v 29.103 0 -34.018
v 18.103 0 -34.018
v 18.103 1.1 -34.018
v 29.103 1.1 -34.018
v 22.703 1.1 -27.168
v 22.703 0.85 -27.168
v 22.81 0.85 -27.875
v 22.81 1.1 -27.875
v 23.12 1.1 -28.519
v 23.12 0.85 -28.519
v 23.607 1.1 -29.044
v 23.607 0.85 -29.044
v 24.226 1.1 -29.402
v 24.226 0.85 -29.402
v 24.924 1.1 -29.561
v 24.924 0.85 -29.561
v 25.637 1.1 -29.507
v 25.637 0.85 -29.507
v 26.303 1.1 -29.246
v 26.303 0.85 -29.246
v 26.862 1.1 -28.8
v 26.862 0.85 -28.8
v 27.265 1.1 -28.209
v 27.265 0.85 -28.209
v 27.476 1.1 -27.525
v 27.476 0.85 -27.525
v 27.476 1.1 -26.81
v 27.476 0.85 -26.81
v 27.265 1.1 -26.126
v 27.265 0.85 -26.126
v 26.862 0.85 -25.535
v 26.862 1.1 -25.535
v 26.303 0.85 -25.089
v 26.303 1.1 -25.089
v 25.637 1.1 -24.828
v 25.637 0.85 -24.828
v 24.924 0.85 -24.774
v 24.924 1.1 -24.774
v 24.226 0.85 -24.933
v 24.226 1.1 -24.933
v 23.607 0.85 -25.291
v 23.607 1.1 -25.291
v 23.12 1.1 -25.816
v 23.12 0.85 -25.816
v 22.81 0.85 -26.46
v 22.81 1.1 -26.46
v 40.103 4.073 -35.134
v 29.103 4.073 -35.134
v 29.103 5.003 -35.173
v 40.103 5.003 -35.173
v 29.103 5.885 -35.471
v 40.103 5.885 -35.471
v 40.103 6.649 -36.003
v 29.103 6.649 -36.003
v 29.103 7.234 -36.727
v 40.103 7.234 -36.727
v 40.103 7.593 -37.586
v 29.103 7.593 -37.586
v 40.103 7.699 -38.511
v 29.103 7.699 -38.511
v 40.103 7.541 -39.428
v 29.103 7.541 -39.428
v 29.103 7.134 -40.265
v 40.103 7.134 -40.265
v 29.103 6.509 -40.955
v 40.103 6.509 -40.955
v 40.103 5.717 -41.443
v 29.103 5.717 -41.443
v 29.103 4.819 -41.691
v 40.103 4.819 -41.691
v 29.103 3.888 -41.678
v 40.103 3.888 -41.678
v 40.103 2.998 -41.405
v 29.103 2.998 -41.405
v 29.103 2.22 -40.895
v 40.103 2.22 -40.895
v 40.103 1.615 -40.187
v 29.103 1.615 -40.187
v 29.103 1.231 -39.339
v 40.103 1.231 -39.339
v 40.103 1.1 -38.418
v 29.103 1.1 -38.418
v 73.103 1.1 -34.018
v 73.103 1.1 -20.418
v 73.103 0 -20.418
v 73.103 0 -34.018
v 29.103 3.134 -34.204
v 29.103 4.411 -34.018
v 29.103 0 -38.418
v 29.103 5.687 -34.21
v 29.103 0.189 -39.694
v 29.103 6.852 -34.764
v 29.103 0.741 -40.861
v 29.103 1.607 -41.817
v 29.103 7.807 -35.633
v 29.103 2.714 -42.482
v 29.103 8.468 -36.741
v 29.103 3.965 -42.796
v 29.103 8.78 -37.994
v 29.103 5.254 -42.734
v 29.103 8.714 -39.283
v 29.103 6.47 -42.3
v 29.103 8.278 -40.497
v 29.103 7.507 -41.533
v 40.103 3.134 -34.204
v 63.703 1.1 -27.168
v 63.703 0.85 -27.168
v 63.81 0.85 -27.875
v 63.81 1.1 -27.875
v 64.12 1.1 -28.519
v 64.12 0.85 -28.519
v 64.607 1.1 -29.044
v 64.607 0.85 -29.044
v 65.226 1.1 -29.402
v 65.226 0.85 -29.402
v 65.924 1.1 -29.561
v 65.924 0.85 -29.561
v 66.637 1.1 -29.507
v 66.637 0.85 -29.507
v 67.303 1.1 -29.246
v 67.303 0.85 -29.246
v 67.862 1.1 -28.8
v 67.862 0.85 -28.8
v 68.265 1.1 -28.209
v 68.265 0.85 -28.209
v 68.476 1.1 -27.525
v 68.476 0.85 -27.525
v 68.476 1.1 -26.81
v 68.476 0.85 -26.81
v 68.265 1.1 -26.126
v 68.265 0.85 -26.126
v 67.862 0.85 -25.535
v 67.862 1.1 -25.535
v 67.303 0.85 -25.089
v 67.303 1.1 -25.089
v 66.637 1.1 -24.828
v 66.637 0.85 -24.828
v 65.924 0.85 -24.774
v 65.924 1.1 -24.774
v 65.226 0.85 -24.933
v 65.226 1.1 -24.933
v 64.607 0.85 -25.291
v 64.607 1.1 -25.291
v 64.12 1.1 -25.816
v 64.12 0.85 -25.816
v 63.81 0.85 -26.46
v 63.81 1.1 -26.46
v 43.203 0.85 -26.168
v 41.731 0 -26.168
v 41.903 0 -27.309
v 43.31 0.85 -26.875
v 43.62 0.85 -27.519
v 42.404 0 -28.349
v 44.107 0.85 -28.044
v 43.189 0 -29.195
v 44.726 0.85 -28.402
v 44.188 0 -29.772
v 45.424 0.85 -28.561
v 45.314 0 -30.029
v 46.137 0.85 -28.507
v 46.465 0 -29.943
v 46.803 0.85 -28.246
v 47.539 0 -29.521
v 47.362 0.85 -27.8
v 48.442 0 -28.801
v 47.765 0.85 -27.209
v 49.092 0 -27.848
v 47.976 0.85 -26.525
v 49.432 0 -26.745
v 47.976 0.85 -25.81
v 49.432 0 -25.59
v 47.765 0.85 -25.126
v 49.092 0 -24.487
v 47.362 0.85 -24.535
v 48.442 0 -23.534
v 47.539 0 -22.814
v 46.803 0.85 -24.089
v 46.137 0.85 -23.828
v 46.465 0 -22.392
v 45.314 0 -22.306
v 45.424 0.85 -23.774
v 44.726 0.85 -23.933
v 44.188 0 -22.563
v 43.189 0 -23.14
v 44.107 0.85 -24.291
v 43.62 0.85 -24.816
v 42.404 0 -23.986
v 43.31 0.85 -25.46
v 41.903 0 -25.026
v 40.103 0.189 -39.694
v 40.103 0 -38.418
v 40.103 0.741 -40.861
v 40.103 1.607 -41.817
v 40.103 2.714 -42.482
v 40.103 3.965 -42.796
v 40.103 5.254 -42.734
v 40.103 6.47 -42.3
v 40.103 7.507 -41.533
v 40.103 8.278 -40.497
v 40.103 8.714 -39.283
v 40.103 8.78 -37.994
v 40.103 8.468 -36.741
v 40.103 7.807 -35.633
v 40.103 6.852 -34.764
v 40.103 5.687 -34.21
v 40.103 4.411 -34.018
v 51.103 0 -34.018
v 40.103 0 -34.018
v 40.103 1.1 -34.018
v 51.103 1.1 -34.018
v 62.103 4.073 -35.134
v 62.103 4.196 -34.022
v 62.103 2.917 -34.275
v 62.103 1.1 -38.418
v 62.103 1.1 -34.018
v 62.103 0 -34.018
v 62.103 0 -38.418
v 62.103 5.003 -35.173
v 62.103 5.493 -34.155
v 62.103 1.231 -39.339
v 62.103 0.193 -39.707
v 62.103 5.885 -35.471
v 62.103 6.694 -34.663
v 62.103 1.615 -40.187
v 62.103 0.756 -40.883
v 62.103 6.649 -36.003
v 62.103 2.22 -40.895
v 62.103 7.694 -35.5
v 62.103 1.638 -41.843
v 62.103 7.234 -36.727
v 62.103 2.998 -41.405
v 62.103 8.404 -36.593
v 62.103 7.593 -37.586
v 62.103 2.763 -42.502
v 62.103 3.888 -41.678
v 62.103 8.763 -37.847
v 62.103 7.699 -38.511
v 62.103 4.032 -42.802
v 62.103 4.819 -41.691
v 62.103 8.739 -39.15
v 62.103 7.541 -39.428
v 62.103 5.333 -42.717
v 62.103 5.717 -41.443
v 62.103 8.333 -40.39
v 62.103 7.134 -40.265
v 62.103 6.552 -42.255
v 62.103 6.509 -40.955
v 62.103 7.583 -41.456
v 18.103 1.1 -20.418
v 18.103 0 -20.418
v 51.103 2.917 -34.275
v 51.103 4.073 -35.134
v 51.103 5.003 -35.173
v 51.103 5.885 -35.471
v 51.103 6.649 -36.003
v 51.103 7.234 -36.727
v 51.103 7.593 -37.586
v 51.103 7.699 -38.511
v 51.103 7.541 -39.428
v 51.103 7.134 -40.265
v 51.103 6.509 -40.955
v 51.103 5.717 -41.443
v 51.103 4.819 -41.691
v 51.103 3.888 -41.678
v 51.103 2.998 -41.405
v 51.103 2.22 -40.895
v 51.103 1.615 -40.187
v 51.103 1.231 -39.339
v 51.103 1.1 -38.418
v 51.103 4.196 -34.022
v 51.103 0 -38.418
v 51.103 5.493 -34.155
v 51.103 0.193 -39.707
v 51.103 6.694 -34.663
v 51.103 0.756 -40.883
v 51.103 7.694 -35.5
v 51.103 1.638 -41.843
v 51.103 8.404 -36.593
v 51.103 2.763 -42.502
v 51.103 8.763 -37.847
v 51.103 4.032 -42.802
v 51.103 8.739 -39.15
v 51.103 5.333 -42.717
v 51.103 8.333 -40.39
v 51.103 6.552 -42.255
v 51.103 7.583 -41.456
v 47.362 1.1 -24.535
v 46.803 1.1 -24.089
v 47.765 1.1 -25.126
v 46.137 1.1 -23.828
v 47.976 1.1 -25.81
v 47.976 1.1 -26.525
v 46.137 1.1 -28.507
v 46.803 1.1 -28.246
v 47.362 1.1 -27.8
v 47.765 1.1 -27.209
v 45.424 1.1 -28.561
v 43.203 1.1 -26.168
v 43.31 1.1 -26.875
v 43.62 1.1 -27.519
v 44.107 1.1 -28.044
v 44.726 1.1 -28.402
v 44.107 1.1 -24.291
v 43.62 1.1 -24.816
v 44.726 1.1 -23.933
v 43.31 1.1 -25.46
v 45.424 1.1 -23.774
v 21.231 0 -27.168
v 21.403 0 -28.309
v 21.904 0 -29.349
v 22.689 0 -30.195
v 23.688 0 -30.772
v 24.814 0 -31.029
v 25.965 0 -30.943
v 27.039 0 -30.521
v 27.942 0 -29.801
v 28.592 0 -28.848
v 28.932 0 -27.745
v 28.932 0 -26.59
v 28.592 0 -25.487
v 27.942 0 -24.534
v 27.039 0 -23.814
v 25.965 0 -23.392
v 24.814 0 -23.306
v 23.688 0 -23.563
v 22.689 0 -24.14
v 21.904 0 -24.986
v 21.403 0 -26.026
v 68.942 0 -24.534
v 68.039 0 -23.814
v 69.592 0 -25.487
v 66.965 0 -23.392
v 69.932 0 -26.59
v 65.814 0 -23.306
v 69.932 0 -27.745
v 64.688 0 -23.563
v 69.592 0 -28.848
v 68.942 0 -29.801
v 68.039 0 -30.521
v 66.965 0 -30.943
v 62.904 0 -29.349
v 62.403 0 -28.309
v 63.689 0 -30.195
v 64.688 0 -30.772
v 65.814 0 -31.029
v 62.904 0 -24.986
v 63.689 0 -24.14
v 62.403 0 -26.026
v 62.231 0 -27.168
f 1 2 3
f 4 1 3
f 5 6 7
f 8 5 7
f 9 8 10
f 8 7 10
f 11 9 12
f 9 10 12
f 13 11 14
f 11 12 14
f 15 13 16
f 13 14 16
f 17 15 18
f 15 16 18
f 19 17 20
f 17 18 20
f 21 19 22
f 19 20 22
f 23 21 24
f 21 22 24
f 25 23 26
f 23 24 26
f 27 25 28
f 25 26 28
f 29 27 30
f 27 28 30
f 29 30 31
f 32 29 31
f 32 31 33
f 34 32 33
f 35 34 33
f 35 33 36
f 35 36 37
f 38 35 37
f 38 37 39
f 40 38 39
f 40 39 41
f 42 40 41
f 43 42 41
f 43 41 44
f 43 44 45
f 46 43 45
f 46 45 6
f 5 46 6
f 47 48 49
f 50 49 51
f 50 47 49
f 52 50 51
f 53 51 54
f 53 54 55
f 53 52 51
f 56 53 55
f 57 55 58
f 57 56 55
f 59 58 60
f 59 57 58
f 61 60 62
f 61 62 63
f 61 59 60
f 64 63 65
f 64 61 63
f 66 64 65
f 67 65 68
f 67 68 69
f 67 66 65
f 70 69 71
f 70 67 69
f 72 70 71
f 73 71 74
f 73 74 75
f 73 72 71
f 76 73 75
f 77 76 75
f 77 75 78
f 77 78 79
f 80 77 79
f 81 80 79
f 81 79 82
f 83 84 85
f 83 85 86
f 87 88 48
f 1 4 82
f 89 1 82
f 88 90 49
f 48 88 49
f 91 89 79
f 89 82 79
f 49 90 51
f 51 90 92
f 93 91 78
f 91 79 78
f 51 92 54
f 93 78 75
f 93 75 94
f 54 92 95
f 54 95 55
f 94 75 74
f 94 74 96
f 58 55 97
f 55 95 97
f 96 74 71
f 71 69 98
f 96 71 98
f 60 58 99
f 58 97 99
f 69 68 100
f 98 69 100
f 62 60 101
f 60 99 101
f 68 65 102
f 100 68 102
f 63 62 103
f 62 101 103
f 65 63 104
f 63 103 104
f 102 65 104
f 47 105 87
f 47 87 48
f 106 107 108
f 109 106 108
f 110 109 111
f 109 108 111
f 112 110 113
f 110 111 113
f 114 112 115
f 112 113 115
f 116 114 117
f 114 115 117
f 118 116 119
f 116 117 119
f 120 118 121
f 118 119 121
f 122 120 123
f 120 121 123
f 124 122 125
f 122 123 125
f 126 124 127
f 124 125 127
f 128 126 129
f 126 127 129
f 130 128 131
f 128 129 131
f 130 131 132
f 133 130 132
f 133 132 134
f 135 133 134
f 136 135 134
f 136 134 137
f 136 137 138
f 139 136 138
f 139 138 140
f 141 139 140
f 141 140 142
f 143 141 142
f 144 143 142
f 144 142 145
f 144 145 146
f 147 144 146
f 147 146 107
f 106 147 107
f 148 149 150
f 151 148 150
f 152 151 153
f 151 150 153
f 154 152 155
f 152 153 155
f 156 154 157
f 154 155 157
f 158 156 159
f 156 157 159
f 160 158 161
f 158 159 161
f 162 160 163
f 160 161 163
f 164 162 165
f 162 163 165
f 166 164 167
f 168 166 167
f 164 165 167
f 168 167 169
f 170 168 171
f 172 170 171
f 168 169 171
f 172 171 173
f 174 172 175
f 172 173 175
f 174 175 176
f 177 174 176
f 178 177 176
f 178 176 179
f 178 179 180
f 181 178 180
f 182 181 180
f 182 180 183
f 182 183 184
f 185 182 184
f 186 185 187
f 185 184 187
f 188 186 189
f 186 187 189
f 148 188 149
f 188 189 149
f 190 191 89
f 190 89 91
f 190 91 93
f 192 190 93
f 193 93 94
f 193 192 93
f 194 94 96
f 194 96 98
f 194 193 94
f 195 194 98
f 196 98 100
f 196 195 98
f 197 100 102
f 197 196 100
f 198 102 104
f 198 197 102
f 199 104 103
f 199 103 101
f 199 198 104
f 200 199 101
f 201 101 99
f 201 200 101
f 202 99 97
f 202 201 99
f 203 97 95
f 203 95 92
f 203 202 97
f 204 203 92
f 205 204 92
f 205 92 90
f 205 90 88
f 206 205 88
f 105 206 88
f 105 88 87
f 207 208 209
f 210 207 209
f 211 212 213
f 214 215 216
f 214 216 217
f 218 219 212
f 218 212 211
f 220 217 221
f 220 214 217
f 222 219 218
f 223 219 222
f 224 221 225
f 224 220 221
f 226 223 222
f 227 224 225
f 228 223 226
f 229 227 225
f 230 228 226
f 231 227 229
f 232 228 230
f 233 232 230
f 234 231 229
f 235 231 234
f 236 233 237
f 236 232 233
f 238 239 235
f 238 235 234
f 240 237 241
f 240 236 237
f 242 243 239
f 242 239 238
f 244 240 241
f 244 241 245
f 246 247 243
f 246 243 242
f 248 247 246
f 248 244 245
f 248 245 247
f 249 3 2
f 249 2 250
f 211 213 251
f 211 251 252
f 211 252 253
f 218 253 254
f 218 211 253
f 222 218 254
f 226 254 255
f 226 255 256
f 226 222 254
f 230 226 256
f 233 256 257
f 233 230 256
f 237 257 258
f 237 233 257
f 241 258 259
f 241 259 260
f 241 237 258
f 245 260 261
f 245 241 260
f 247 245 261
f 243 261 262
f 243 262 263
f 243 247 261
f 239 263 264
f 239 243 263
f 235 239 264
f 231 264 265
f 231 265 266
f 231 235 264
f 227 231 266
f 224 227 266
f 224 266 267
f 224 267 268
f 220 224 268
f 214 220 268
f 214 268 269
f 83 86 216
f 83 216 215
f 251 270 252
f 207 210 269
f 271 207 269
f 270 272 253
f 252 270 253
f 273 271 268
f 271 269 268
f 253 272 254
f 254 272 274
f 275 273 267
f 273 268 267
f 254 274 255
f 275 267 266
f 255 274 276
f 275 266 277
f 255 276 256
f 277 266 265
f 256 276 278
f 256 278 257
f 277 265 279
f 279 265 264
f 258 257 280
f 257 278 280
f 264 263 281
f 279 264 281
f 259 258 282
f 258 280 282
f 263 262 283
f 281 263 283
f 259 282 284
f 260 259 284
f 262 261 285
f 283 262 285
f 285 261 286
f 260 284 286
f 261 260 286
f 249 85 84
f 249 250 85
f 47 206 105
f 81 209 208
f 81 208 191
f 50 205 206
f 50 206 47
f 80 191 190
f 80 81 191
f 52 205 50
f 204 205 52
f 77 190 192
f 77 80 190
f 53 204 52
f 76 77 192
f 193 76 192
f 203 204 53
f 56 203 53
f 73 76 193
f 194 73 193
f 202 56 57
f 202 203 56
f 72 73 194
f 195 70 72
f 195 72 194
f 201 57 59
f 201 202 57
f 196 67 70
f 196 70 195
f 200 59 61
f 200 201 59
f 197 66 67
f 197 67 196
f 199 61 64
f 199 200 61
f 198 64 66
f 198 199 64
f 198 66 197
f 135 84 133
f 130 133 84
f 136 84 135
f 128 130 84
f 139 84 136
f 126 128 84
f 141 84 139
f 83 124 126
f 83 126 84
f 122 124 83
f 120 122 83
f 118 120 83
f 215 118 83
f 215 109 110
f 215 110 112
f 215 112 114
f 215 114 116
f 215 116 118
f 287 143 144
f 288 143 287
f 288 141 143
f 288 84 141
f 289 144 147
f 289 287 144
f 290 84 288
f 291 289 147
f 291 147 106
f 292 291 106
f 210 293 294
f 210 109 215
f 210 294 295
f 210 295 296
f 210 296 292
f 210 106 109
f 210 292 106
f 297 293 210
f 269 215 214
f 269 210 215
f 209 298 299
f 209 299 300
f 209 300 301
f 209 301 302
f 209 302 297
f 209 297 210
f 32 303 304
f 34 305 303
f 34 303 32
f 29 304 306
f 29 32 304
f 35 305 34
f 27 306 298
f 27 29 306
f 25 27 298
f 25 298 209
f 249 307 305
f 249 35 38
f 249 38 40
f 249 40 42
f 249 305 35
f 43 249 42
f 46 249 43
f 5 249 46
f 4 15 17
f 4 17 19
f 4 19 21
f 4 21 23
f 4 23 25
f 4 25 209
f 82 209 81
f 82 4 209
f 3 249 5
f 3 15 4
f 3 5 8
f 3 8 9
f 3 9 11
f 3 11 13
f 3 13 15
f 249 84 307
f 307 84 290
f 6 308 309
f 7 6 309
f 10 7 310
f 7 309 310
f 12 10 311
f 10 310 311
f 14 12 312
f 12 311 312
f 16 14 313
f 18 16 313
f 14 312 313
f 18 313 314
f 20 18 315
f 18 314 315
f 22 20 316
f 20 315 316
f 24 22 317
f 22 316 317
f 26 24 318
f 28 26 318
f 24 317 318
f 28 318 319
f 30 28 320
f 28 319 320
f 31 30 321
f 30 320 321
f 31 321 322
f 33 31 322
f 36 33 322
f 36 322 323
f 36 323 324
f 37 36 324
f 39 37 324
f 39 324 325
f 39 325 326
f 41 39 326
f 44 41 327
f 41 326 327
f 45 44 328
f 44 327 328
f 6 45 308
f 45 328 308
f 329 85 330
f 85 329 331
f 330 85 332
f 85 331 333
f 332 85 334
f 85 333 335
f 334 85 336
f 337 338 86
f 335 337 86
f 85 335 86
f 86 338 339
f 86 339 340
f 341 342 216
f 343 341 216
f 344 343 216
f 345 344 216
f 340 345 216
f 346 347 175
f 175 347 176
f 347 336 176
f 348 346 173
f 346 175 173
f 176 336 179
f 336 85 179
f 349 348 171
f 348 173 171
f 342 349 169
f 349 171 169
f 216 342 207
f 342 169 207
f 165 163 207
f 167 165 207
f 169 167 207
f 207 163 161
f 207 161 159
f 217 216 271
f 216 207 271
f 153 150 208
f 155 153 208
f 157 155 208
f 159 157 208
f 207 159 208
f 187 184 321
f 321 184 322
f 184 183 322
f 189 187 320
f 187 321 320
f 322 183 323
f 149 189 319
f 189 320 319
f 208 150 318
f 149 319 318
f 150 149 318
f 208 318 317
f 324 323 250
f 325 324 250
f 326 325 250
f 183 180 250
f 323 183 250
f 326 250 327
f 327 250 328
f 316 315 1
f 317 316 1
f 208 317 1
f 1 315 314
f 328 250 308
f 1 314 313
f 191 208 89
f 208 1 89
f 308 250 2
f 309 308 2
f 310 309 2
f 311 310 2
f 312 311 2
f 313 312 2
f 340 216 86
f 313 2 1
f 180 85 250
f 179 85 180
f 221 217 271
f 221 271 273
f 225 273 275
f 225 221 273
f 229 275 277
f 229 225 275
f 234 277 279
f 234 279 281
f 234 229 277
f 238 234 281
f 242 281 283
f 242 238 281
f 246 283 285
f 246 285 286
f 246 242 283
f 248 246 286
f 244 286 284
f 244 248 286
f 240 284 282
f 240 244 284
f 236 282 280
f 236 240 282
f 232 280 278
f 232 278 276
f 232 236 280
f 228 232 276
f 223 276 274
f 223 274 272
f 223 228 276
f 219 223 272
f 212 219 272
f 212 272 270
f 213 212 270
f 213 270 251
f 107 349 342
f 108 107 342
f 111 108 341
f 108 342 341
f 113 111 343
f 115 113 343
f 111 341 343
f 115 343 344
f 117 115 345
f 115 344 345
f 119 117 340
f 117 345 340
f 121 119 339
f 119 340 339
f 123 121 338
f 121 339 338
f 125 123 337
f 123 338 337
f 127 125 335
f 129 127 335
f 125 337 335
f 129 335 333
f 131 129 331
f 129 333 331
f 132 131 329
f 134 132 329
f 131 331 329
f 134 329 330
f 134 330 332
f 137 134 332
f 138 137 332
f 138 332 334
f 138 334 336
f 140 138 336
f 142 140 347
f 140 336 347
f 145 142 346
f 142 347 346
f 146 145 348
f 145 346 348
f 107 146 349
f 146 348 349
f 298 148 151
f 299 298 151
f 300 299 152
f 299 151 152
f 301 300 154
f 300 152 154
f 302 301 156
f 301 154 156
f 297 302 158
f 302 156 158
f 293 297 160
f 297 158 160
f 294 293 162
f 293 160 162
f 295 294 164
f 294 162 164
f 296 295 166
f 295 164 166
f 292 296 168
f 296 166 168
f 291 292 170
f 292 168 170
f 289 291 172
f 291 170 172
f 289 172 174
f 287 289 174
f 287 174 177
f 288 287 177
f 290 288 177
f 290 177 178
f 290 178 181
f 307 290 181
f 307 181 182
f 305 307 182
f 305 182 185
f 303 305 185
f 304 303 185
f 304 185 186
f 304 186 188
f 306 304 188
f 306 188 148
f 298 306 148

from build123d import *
from OCP.BRepFilletAPI import BRepFilletAPI_MakeChamfer

# Parameters (mm, degrees)
BOSS_EXTRUDE1_DEPTH = 11
SKETCH2_W           = 13.6
SKETCH2_H           = 1.1
BOSS_EXTRUDE2_DEPTH = 11
BOSS_EXTRUDE3_DEPTH = 11
SKETCH4_W           = 13.6
SKETCH4_H           = 1.1
BOSS_EXTRUDE4_DEPTH = 11
SKETCH5_W           = 13.6
SKETCH5_H           = 1.1
BOSS_EXTRUDE5_DEPTH = 11
HOLE_WIZARD_M4_1_D  = 4.8
CHAMFER1_SIZE       = 0.85
CHAMFER1_SIZE2      = 1.472243186


with BuildPart() as part:
    # Sketch1 → Boss-Extrude1 (new body)
    with BuildSketch(Plane(origin=(62.103, 0, 0), x_dir=(0, 0, -1), z_dir=(1, 0, 0))):
        with BuildLine():
            Line((34.275005652, 2.916847756), (35.133702257, 4.073392616))
            ThreePointArc((35.133702257, 4.073392616), (40.63247129, 6.846201583), (38.4175, 1.1))
            Line((38.4175, 1.1), (20.4175, 1.1))
            Line((20.4175, 1.1), (20.4175, 0))
            Line((20.4175, 0), (38.4175, 0))
            ThreePointArc((38.4175, 0), (40.950692662, 7.997629072), (34.275005652, 2.916847756))
        make_face()
    extrude(amount=-BOSS_EXTRUDE1_DEPTH)

    # Sketch2 → Boss-Extrude2 (add)
    with BuildSketch(Plane.ZY.offset(-51.103)):
        with Locations((-27.2175, 0.55)):
            Rectangle(SKETCH2_W, SKETCH2_H)
    extrude(amount=BOSS_EXTRUDE2_DEPTH)

    # Sketch3 → Boss-Extrude3 (add)
    with BuildSketch(Plane.ZY.offset(-40.103)):
        with BuildLine():
            Line((-38.4175, 1.1), (-20.4175, 1.1))
            Line((-20.4175, 1.1), (-20.4175, 0))
            Line((-20.4175, 0), (-38.4175, 0))
            ThreePointArc((-38.4175, 0), (-41.043236571, 7.930652555), (-34.203607486, 3.133860244))
            Line((-34.203607486, 3.133860244), (-35.133702257, 4.073392616))
            ThreePointArc((-35.133702257, 4.073392616), (-40.63247129, 6.846201583), (-38.4175, 1.1))
        make_face()
    extrude(amount=BOSS_EXTRUDE3_DEPTH)

    # Sketch4 → Boss-Extrude4 (add)
    with BuildSketch(Plane.ZY.offset(-29.103)):
        with Locations((-27.2175, 0.55)):
            Rectangle(SKETCH4_W, SKETCH4_H)
    extrude(amount=BOSS_EXTRUDE4_DEPTH)

    # Sketch5 → Boss-Extrude5 (add)
    with BuildSketch(Plane(origin=(62.103, 0, 0), x_dir=(0, 0, -1), z_dir=(1, 0, 0))):
        with Locations((27.2175, 0.55)):
            Rectangle(SKETCH5_W, SKETCH5_H)
    extrude(amount=BOSS_EXTRUDE5_DEPTH)

    # M4 间隙孔1 (through all)
    with Locations(Plane(origin=(0, 1.1, 0), x_dir=(1, 0, 0), z_dir=(0, 1, 0))):
        with Locations((45.603, 26.1675), (25.103, 27.1675), (66.103, 27.1675)):
            Hole(HOLE_WIZARD_M4_1_D / 2)

    # Chamfer1: one chamfer whose edges measure the first distance from different faces: ONE call of the kernel's chamfer builder (chamfer() names one face for all edges)
    chamfer1_edges_1 = [part.edges().sort_by_distance(p)[0] for p in [
        (68.503, 0, -27.1675),
    ]]
    chamfer1_side_1 = [part.faces().sort_by_distance(p)[0] for p in [
        (68.503, 0.55, -27.1675),
    ]]
    chamfer1_edges_2 = [part.edges().sort_by_distance(p)[0] for p in [
        (27.503, 0, -27.1675),
    ]]
    chamfer1_side_2 = [part.faces().sort_by_distance(p)[0] for p in [
        (27.503, 0.55, -27.1675),
    ]]
    chamfer1_edges_3 = [part.edges().sort_by_distance(p)[0] for p in [
        (48.003, 0, -26.1675),
    ]]
    chamfer1_side_3 = [part.faces().sort_by_distance(p)[0] for p in [
        (48.003, 0.55, -26.1675),
    ]]
    chamfer1 = BRepFilletAPI_MakeChamfer(part.part.solid().wrapped)
    for e in chamfer1_edges_1:
        chamfer1.Add(CHAMFER1_SIZE, CHAMFER1_SIZE2, e.wrapped, chamfer1_side_1[0].wrapped)  # the first distance lies on this face
    for e in chamfer1_edges_2:
        chamfer1.Add(CHAMFER1_SIZE, CHAMFER1_SIZE2, e.wrapped, chamfer1_side_2[0].wrapped)  # the first distance lies on this face
    for e in chamfer1_edges_3:
        chamfer1.Add(CHAMFER1_SIZE, CHAMFER1_SIZE2, e.wrapped, chamfer1_side_3[0].wrapped)  # the first distance lies on this face
    add(Compound.cast(chamfer1.Shape()), mode=Mode.REPLACE)


solid = part.part
